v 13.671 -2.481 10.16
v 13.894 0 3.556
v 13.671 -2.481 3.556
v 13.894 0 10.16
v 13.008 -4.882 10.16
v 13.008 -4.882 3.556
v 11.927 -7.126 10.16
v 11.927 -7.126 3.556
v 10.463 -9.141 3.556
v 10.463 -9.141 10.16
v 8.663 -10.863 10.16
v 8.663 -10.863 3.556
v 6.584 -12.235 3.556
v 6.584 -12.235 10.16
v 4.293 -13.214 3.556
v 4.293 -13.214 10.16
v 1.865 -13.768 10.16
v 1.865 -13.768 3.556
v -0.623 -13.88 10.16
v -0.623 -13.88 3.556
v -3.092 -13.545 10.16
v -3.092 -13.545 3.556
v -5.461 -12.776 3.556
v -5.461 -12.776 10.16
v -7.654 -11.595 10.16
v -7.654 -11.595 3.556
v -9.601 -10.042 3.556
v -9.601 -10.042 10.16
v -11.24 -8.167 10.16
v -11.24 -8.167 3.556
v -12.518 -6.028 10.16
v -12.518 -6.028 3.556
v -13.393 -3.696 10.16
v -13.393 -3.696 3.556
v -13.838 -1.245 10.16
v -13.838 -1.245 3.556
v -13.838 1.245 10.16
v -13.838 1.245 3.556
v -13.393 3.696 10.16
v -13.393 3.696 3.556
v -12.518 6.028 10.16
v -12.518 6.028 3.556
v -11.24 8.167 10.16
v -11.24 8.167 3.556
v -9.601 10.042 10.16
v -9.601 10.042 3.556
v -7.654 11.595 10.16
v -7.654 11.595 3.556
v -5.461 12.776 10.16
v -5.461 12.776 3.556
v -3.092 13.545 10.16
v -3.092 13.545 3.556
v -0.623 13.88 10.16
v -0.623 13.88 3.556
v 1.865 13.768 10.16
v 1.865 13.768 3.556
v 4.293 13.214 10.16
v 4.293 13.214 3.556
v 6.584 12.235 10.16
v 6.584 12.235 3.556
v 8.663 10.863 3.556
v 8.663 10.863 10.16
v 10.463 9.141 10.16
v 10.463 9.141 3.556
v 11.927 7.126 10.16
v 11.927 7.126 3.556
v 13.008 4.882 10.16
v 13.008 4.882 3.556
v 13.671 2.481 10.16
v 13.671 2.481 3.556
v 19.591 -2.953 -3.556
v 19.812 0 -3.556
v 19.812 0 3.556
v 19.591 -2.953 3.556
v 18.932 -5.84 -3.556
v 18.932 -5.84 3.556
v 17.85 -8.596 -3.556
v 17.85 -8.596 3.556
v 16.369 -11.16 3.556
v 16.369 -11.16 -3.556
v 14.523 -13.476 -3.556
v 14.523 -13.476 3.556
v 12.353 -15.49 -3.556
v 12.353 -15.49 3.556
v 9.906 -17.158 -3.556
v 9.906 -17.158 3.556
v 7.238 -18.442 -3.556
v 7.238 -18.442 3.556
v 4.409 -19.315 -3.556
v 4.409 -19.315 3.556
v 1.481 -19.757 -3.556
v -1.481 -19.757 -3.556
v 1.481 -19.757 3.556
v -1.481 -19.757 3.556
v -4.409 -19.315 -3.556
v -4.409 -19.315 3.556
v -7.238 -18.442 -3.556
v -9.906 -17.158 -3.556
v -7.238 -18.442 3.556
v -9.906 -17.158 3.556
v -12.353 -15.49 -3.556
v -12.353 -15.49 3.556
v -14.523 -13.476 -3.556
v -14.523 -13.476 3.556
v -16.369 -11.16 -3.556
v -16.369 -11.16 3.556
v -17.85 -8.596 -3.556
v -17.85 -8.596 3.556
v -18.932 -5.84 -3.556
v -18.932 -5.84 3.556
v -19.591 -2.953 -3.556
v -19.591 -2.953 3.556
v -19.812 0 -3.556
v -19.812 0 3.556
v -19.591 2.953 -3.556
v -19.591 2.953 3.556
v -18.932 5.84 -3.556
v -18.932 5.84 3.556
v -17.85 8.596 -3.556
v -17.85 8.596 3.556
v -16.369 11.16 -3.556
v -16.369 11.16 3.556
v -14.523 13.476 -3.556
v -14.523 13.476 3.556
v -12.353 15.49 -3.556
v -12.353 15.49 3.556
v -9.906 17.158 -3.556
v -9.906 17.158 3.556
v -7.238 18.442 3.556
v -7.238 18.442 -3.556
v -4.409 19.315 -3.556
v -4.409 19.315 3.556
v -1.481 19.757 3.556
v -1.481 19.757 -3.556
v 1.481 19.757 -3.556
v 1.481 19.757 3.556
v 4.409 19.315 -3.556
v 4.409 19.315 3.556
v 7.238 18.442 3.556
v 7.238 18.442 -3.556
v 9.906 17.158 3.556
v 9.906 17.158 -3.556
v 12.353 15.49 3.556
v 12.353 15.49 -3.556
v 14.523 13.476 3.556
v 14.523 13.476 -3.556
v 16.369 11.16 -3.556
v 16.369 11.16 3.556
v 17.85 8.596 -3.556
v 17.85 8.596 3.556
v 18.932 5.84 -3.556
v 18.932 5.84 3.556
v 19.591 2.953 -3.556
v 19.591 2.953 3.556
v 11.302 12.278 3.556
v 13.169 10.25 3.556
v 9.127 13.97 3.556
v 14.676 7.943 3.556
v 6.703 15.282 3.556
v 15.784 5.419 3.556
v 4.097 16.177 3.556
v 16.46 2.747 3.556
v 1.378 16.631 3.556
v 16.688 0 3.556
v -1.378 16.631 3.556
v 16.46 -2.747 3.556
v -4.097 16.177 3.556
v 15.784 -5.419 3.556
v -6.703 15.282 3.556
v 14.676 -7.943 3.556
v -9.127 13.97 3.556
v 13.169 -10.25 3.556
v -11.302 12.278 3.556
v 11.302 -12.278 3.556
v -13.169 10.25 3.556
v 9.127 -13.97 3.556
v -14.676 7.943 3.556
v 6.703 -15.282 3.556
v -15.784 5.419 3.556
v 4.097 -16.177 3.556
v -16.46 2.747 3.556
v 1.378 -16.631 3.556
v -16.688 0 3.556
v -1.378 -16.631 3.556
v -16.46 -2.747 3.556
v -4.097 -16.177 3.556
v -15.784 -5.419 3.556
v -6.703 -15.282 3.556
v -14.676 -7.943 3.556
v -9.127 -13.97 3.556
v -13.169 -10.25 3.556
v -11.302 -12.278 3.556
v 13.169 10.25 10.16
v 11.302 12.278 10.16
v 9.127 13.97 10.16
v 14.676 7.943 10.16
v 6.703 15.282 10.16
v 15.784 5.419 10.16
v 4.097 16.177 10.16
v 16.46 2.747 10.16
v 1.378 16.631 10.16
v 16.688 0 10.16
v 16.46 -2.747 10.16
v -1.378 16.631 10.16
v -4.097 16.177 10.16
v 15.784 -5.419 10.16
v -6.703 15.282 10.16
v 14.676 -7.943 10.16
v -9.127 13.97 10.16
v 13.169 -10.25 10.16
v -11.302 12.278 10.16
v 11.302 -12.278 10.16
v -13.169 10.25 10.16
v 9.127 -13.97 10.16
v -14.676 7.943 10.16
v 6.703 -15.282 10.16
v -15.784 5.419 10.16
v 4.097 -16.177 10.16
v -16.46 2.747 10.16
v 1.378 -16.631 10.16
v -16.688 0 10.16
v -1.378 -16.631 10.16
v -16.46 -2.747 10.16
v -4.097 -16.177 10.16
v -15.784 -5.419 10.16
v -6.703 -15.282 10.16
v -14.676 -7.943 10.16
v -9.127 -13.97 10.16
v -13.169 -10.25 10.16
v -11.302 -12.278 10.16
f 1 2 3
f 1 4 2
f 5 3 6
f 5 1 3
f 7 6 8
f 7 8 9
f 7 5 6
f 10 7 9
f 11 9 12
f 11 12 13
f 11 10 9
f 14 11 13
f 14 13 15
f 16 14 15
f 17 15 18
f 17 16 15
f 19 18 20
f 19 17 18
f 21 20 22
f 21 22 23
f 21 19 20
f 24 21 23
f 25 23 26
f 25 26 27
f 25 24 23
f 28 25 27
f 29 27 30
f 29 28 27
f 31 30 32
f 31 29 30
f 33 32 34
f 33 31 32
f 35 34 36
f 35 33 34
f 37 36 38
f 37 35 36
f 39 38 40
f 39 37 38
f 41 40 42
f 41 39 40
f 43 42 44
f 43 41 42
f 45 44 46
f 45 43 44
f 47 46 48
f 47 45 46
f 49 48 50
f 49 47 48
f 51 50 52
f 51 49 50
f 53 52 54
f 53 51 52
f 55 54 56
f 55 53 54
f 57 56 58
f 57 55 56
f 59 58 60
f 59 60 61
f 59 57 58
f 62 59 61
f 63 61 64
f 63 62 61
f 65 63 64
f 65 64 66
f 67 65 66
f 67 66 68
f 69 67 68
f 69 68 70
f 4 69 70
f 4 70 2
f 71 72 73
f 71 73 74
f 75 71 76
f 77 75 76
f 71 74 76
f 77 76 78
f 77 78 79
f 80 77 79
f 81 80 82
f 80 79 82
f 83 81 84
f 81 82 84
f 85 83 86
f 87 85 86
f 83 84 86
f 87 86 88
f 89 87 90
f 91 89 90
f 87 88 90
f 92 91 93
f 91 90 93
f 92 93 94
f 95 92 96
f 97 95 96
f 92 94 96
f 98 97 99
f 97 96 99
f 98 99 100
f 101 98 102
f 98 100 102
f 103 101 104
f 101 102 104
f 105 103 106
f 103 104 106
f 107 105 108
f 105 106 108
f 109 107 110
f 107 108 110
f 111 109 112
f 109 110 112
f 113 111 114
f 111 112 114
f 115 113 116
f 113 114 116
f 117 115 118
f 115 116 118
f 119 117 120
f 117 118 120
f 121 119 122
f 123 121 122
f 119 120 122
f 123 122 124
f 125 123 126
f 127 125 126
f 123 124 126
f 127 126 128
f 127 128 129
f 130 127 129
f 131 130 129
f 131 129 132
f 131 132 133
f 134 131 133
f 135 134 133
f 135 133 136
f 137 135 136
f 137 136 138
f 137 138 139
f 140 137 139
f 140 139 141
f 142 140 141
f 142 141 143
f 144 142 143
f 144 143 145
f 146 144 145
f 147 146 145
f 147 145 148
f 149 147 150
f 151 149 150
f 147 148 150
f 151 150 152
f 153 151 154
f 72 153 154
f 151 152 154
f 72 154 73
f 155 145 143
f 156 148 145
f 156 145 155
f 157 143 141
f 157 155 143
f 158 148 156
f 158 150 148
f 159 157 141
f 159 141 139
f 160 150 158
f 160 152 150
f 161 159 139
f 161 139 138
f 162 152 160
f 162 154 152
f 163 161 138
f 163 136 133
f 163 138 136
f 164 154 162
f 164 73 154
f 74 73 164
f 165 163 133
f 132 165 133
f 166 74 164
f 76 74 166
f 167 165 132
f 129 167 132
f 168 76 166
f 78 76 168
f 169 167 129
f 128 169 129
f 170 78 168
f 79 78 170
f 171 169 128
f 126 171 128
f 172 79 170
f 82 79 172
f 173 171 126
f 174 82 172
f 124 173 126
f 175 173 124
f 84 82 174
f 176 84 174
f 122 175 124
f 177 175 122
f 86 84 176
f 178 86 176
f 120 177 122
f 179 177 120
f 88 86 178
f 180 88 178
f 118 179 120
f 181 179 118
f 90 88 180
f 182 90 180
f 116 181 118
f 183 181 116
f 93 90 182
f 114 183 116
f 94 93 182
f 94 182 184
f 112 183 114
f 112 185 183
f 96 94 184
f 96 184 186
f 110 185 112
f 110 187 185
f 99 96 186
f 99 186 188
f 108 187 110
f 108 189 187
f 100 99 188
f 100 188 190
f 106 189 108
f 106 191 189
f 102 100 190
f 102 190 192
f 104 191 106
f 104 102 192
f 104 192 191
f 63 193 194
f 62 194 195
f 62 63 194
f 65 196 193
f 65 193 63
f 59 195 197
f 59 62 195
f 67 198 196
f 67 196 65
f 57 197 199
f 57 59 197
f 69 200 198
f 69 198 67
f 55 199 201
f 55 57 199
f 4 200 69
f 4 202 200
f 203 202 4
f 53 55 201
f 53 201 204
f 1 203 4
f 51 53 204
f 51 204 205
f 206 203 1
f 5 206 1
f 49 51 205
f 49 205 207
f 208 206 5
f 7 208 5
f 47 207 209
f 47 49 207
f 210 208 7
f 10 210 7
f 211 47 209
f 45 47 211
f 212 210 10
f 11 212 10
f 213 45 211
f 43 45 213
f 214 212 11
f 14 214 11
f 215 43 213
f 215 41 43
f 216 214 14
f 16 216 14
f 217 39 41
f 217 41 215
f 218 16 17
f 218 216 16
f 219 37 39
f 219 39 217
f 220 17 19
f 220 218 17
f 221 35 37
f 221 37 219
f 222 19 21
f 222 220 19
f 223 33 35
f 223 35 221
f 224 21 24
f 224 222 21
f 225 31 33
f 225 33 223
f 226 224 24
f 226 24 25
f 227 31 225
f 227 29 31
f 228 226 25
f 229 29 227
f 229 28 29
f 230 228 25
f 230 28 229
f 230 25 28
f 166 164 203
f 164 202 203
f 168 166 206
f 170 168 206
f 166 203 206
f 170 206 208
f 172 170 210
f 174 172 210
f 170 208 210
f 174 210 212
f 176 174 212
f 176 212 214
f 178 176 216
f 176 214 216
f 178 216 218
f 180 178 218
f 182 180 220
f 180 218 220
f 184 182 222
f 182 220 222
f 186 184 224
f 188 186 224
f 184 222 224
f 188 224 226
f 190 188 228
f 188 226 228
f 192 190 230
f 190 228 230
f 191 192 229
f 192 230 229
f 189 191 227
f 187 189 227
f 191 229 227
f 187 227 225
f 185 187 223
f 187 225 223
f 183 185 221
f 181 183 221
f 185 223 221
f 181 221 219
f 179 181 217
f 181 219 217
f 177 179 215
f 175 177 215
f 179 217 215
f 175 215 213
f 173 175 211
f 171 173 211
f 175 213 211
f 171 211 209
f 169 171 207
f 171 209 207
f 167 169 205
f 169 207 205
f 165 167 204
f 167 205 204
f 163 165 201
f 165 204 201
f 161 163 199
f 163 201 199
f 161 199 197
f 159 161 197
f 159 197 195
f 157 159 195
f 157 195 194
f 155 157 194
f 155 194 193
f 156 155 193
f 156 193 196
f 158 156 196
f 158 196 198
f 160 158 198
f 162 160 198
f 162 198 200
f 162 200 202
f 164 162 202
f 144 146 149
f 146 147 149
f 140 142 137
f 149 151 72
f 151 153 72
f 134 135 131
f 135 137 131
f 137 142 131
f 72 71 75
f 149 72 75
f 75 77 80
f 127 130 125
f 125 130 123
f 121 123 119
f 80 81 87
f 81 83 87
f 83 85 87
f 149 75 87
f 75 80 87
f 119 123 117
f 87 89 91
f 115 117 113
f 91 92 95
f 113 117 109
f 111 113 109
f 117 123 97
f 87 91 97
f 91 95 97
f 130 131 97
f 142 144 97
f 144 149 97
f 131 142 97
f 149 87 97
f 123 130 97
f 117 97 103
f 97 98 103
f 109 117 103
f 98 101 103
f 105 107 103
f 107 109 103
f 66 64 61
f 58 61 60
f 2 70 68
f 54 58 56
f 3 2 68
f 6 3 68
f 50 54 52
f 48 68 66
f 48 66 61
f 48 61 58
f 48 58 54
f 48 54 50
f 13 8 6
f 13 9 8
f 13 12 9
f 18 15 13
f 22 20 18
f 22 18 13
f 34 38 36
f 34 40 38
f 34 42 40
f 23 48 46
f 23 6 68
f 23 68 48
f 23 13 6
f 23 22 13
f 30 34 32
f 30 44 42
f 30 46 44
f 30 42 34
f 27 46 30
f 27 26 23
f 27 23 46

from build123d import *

# Parameters (mm, degrees)
F1_W = 19.812
F1_H = 7.112
F0_W = 2.794
F0_H = 6.604


with BuildPart() as f2:
    # F1 (on Front) + F0 (on Front) → F2 (revolve)
    with BuildSketch(Plane.XZ):
        with Locations((9.906, 0)):
            Rectangle(F1_W, F1_H)
    with BuildSketch(Plane.XZ):
        with Locations((15.2908, 6.858)):
            Rectangle(F0_W, F0_H)
    revolve(axis=Axis((0, 0, 0), (0, 0, -1)))


solid = f2.part
